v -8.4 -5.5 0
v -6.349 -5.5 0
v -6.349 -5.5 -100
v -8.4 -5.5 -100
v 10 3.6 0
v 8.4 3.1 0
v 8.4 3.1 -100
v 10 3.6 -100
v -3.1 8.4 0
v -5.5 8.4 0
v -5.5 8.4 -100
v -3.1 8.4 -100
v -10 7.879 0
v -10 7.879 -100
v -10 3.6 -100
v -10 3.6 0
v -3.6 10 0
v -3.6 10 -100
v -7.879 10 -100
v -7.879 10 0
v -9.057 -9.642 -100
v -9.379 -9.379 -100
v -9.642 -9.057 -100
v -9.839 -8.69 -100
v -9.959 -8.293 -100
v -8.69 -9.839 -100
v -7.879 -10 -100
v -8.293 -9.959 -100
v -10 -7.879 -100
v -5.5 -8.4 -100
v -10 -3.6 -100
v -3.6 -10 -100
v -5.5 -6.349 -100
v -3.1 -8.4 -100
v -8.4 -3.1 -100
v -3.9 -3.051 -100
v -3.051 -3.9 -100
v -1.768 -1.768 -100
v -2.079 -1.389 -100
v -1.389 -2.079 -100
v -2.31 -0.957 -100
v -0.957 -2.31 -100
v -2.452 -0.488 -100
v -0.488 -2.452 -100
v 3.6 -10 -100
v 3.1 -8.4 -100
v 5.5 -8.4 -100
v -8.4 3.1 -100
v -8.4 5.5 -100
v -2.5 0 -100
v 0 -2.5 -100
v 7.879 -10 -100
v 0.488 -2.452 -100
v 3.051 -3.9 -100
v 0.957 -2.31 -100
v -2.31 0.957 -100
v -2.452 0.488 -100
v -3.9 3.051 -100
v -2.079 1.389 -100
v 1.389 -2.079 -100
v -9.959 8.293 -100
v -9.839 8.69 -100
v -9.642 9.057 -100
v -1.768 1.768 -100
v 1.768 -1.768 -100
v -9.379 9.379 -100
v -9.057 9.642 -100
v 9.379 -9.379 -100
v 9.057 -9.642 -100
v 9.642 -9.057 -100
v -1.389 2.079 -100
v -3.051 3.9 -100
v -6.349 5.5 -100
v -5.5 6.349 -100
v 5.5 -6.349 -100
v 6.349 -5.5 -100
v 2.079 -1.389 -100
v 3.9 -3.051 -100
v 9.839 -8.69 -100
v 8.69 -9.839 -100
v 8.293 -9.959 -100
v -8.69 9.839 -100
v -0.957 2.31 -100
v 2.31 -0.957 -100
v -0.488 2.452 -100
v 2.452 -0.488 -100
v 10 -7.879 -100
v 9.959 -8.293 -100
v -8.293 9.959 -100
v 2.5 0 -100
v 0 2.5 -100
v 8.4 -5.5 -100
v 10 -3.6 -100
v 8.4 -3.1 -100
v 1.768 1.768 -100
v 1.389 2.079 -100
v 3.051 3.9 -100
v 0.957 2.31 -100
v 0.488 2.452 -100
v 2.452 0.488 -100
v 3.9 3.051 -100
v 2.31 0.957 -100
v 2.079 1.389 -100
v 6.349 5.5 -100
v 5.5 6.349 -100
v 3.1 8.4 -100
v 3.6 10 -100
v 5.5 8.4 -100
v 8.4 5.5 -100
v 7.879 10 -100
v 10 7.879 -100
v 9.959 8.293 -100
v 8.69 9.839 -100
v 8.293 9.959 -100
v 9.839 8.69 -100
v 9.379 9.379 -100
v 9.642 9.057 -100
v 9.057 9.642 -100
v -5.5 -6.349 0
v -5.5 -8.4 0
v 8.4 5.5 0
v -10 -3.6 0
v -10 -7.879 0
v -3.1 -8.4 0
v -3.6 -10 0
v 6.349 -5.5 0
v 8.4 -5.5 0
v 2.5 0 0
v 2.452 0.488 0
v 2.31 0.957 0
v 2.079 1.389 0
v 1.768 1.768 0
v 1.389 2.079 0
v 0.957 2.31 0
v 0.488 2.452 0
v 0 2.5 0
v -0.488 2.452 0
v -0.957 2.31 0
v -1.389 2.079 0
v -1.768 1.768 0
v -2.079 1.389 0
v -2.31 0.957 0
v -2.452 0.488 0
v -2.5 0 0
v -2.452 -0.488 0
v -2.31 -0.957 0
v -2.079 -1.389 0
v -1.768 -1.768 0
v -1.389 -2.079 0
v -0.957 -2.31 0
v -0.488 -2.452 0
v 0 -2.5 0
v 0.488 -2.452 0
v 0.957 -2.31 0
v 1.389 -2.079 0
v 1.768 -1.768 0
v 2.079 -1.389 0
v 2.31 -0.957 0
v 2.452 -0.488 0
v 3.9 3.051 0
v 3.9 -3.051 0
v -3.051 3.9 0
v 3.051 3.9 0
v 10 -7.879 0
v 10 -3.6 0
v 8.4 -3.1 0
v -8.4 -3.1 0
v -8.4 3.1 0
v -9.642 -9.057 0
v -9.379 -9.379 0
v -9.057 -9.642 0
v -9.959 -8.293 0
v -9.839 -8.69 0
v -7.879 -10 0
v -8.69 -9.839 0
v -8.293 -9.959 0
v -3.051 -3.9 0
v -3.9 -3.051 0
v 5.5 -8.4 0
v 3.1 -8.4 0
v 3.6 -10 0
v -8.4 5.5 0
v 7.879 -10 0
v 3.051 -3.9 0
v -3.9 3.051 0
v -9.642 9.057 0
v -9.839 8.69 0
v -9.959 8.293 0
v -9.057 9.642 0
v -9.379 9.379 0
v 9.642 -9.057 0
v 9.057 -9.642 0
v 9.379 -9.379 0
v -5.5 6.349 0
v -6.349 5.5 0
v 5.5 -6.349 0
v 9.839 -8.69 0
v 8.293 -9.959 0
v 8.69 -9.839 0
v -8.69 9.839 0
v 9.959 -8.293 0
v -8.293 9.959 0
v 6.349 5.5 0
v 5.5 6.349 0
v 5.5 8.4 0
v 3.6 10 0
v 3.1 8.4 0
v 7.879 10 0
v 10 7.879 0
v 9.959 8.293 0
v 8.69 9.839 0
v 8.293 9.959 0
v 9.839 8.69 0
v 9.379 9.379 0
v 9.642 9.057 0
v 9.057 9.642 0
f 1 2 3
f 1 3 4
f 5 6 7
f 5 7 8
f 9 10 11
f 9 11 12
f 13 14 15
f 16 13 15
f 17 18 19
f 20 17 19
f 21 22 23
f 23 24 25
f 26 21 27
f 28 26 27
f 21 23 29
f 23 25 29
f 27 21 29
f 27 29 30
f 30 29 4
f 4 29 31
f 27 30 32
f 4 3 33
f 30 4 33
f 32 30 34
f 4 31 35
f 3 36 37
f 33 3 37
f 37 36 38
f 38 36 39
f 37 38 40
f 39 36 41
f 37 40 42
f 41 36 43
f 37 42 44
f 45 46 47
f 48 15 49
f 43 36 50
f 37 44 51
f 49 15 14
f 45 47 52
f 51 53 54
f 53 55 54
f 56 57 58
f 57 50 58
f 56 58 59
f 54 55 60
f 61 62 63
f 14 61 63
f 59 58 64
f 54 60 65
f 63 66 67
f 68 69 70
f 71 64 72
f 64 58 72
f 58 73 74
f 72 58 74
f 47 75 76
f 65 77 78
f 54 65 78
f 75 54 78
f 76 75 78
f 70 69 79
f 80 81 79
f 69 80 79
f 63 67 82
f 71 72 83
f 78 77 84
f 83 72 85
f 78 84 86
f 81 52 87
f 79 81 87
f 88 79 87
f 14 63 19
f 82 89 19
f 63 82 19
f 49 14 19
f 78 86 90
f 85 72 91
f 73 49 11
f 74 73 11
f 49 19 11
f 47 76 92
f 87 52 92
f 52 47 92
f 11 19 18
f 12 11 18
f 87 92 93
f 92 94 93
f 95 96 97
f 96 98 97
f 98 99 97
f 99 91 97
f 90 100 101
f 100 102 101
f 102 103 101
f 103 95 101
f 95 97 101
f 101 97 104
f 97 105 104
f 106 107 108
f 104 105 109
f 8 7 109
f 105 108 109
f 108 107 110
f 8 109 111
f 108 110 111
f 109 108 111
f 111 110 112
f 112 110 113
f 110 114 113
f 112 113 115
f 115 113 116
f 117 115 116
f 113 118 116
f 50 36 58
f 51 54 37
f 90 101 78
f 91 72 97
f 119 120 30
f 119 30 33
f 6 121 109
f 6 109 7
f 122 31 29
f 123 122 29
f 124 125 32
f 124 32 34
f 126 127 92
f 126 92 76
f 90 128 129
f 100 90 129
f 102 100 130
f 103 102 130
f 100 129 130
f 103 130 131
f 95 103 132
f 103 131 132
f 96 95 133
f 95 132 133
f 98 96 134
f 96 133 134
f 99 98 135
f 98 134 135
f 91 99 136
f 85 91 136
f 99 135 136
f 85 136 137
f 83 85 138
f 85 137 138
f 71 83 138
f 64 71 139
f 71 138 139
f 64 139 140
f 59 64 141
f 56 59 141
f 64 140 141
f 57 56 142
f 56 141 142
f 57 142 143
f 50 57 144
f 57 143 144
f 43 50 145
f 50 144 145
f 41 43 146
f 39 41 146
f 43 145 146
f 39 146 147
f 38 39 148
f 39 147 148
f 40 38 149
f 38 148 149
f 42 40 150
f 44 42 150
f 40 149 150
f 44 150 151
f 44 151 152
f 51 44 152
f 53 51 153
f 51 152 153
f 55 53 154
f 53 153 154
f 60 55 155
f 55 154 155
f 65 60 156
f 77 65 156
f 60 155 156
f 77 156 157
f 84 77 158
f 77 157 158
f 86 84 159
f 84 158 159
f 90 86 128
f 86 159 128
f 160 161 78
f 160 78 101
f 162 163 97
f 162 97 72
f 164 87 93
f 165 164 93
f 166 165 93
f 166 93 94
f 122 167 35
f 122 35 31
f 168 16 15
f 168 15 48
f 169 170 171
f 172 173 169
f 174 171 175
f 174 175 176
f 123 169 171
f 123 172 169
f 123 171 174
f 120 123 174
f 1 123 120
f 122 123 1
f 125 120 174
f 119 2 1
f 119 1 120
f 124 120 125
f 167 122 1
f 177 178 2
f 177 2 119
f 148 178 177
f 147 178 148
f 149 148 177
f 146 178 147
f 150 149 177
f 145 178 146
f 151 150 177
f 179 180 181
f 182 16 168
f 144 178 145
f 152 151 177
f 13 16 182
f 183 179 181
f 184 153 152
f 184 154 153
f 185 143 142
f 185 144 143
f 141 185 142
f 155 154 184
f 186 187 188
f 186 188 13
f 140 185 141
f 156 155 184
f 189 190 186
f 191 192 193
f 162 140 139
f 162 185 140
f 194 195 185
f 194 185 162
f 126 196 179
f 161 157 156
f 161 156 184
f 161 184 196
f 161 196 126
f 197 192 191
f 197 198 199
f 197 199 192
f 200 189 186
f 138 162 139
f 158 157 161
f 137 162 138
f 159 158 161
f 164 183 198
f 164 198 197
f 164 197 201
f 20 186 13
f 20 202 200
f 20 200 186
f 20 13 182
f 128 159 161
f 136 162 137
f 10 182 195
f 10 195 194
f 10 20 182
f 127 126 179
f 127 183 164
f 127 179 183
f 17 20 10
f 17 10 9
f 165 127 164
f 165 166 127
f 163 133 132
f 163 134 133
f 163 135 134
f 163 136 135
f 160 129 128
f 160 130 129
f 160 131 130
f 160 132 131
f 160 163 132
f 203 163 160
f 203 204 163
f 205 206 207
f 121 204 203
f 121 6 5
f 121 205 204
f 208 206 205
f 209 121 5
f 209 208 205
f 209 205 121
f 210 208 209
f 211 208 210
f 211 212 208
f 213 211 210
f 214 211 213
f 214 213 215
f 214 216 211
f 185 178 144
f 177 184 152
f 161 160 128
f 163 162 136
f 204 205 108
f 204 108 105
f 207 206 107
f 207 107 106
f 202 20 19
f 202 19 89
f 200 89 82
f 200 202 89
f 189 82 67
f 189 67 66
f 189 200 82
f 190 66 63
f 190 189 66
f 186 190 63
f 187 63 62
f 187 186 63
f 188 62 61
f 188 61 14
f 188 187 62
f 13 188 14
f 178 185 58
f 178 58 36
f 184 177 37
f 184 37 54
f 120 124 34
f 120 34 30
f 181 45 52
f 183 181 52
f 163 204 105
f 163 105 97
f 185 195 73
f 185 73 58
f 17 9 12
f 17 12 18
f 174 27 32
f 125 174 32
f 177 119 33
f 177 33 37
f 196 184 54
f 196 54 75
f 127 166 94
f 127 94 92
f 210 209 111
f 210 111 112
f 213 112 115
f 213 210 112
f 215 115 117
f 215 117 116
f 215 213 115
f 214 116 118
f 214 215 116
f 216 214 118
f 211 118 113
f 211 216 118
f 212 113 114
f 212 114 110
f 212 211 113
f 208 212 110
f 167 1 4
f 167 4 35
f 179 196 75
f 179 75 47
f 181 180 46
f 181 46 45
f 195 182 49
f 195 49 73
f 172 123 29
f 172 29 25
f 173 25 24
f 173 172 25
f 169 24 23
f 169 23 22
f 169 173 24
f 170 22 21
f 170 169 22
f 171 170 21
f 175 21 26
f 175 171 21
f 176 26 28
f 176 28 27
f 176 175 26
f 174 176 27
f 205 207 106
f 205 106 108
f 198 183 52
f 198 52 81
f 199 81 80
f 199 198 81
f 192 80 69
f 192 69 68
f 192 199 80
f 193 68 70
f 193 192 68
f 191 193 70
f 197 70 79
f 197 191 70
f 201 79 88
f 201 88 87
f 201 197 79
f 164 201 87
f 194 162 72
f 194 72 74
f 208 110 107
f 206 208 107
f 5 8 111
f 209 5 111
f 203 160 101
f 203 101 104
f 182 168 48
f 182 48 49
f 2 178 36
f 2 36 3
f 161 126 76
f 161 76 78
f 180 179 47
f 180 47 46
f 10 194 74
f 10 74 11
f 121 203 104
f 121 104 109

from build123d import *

# Parameters (mm, degrees)
SKETCH_1_R      = 2.5
EXTRUDE_1_DEPTH = 100


with BuildPart() as part:
    # 草图1 → 凸台-拉伸1 (new body)
    with BuildSketch(Plane.XY):
        with BuildLine():
            ThreePointArc((-7.878679656, 10), (-9.378679656, 9.378679656), (-10, 7.878679656))
            Line((-10, 7.878679656), (-10, 3.6))
            Line((-10, 3.6), (-8.4, 3.1))
            Line((-8.4, 3.1), (-8.4, 5.5))
            Line((-8.4, 5.5), (-6.348528137, 5.5))
            Line((-6.348528137, 5.5), (-3.9, 3.051471863))
            Line((-3.9, 3.051471863), (-3.9, -3.051471863))
            Line((-3.9, -3.051471863), (-6.348528137, -5.5))
            Line((-6.348528137, -5.5), (-8.4, -5.5))
            Line((-8.4, -5.5), (-8.4, -3.1))
            Line((-8.4, -3.1), (-10, -3.6))
            Line((-10, -3.6), (-10, -7.878679656))
            ThreePointArc((-10, -7.878679656), (-9.378679656, -9.378679656), (-7.878679656, -10))
            Line((-7.878679656, -10), (-3.6, -10))
            Line((-3.6, -10), (-3.1, -8.4))
            Line((-3.1, -8.4), (-5.5, -8.4))
            Line((-5.5, -8.4), (-5.5, -6.348528137))
            Line((-5.5, -6.348528137), (-3.051471863, -3.9))
            Line((-3.051471863, -3.9), (3.051471863, -3.9))
            Line((3.051471863, -3.9), (5.5, -6.348528137))
            Line((5.5, -6.348528137), (5.5, -8.4))
            Line((5.5, -8.4), (3.1, -8.4))
            Line((3.1, -8.4), (3.6, -10))
            Line((3.6, -10), (7.878679656, -10))
            ThreePointArc((7.878679656, -10), (9.378679656, -9.378679656), (10, -7.878679656))
            Line((10, -7.878679656), (10, -3.6))
            Line((10, -3.6), (8.4, -3.1))
            Line((8.4, -3.1), (8.4, -5.5))
            Line((8.4, -5.5), (6.348528137, -5.5))
            Line((6.348528137, -5.5), (3.9, -3.051471863))
            Line((3.9, -3.051471863), (3.9, 3.051471863))
            Line((3.9, 3.051471863), (6.348528137, 5.5))
            Line((6.348528137, 5.5), (8.4, 5.5))
            Line((8.4, 5.5), (8.4, 3.1))
            Line((8.4, 3.1), (10, 3.6))
            Line((10, 3.6), (10, 7.878679656))
            ThreePointArc((10, 7.878679656), (9.378679656, 9.378679656), (7.878679656, 10))
            Line((7.878679656, 10), (6.359631643, 10))
            Line((6.359631643, 10), (3.6, 10))
            Line((3.6, 10), (3.1, 8.4))
            Line((3.1, 8.4), (5.5, 8.4))
            Line((5.5, 8.4), (5.5, 6.348528137))
            Line((5.5, 6.348528137), (3.051471863, 3.9))
            Line((3.051471863, 3.9), (-3.051471863, 3.9))
            Line((-3.051471863, 3.9), (-5.5, 6.348528137))
            Line((-5.5, 6.348528137), (-5.5, 8.4))
            Line((-5.5, 8.4), (-3.1, 8.4))
            Line((-3.1, 8.4), (-3.6, 10))
            Line((-3.6, 10), (-6.359631643, 10))
            Line((-6.359631643, 10), (-7.878679656, 10))
        make_face()
        Circle(SKETCH_1_R, mode=Mode.SUBTRACT)
    extrude(amount=-EXTRUDE_1_DEPTH)


solid = part.part
